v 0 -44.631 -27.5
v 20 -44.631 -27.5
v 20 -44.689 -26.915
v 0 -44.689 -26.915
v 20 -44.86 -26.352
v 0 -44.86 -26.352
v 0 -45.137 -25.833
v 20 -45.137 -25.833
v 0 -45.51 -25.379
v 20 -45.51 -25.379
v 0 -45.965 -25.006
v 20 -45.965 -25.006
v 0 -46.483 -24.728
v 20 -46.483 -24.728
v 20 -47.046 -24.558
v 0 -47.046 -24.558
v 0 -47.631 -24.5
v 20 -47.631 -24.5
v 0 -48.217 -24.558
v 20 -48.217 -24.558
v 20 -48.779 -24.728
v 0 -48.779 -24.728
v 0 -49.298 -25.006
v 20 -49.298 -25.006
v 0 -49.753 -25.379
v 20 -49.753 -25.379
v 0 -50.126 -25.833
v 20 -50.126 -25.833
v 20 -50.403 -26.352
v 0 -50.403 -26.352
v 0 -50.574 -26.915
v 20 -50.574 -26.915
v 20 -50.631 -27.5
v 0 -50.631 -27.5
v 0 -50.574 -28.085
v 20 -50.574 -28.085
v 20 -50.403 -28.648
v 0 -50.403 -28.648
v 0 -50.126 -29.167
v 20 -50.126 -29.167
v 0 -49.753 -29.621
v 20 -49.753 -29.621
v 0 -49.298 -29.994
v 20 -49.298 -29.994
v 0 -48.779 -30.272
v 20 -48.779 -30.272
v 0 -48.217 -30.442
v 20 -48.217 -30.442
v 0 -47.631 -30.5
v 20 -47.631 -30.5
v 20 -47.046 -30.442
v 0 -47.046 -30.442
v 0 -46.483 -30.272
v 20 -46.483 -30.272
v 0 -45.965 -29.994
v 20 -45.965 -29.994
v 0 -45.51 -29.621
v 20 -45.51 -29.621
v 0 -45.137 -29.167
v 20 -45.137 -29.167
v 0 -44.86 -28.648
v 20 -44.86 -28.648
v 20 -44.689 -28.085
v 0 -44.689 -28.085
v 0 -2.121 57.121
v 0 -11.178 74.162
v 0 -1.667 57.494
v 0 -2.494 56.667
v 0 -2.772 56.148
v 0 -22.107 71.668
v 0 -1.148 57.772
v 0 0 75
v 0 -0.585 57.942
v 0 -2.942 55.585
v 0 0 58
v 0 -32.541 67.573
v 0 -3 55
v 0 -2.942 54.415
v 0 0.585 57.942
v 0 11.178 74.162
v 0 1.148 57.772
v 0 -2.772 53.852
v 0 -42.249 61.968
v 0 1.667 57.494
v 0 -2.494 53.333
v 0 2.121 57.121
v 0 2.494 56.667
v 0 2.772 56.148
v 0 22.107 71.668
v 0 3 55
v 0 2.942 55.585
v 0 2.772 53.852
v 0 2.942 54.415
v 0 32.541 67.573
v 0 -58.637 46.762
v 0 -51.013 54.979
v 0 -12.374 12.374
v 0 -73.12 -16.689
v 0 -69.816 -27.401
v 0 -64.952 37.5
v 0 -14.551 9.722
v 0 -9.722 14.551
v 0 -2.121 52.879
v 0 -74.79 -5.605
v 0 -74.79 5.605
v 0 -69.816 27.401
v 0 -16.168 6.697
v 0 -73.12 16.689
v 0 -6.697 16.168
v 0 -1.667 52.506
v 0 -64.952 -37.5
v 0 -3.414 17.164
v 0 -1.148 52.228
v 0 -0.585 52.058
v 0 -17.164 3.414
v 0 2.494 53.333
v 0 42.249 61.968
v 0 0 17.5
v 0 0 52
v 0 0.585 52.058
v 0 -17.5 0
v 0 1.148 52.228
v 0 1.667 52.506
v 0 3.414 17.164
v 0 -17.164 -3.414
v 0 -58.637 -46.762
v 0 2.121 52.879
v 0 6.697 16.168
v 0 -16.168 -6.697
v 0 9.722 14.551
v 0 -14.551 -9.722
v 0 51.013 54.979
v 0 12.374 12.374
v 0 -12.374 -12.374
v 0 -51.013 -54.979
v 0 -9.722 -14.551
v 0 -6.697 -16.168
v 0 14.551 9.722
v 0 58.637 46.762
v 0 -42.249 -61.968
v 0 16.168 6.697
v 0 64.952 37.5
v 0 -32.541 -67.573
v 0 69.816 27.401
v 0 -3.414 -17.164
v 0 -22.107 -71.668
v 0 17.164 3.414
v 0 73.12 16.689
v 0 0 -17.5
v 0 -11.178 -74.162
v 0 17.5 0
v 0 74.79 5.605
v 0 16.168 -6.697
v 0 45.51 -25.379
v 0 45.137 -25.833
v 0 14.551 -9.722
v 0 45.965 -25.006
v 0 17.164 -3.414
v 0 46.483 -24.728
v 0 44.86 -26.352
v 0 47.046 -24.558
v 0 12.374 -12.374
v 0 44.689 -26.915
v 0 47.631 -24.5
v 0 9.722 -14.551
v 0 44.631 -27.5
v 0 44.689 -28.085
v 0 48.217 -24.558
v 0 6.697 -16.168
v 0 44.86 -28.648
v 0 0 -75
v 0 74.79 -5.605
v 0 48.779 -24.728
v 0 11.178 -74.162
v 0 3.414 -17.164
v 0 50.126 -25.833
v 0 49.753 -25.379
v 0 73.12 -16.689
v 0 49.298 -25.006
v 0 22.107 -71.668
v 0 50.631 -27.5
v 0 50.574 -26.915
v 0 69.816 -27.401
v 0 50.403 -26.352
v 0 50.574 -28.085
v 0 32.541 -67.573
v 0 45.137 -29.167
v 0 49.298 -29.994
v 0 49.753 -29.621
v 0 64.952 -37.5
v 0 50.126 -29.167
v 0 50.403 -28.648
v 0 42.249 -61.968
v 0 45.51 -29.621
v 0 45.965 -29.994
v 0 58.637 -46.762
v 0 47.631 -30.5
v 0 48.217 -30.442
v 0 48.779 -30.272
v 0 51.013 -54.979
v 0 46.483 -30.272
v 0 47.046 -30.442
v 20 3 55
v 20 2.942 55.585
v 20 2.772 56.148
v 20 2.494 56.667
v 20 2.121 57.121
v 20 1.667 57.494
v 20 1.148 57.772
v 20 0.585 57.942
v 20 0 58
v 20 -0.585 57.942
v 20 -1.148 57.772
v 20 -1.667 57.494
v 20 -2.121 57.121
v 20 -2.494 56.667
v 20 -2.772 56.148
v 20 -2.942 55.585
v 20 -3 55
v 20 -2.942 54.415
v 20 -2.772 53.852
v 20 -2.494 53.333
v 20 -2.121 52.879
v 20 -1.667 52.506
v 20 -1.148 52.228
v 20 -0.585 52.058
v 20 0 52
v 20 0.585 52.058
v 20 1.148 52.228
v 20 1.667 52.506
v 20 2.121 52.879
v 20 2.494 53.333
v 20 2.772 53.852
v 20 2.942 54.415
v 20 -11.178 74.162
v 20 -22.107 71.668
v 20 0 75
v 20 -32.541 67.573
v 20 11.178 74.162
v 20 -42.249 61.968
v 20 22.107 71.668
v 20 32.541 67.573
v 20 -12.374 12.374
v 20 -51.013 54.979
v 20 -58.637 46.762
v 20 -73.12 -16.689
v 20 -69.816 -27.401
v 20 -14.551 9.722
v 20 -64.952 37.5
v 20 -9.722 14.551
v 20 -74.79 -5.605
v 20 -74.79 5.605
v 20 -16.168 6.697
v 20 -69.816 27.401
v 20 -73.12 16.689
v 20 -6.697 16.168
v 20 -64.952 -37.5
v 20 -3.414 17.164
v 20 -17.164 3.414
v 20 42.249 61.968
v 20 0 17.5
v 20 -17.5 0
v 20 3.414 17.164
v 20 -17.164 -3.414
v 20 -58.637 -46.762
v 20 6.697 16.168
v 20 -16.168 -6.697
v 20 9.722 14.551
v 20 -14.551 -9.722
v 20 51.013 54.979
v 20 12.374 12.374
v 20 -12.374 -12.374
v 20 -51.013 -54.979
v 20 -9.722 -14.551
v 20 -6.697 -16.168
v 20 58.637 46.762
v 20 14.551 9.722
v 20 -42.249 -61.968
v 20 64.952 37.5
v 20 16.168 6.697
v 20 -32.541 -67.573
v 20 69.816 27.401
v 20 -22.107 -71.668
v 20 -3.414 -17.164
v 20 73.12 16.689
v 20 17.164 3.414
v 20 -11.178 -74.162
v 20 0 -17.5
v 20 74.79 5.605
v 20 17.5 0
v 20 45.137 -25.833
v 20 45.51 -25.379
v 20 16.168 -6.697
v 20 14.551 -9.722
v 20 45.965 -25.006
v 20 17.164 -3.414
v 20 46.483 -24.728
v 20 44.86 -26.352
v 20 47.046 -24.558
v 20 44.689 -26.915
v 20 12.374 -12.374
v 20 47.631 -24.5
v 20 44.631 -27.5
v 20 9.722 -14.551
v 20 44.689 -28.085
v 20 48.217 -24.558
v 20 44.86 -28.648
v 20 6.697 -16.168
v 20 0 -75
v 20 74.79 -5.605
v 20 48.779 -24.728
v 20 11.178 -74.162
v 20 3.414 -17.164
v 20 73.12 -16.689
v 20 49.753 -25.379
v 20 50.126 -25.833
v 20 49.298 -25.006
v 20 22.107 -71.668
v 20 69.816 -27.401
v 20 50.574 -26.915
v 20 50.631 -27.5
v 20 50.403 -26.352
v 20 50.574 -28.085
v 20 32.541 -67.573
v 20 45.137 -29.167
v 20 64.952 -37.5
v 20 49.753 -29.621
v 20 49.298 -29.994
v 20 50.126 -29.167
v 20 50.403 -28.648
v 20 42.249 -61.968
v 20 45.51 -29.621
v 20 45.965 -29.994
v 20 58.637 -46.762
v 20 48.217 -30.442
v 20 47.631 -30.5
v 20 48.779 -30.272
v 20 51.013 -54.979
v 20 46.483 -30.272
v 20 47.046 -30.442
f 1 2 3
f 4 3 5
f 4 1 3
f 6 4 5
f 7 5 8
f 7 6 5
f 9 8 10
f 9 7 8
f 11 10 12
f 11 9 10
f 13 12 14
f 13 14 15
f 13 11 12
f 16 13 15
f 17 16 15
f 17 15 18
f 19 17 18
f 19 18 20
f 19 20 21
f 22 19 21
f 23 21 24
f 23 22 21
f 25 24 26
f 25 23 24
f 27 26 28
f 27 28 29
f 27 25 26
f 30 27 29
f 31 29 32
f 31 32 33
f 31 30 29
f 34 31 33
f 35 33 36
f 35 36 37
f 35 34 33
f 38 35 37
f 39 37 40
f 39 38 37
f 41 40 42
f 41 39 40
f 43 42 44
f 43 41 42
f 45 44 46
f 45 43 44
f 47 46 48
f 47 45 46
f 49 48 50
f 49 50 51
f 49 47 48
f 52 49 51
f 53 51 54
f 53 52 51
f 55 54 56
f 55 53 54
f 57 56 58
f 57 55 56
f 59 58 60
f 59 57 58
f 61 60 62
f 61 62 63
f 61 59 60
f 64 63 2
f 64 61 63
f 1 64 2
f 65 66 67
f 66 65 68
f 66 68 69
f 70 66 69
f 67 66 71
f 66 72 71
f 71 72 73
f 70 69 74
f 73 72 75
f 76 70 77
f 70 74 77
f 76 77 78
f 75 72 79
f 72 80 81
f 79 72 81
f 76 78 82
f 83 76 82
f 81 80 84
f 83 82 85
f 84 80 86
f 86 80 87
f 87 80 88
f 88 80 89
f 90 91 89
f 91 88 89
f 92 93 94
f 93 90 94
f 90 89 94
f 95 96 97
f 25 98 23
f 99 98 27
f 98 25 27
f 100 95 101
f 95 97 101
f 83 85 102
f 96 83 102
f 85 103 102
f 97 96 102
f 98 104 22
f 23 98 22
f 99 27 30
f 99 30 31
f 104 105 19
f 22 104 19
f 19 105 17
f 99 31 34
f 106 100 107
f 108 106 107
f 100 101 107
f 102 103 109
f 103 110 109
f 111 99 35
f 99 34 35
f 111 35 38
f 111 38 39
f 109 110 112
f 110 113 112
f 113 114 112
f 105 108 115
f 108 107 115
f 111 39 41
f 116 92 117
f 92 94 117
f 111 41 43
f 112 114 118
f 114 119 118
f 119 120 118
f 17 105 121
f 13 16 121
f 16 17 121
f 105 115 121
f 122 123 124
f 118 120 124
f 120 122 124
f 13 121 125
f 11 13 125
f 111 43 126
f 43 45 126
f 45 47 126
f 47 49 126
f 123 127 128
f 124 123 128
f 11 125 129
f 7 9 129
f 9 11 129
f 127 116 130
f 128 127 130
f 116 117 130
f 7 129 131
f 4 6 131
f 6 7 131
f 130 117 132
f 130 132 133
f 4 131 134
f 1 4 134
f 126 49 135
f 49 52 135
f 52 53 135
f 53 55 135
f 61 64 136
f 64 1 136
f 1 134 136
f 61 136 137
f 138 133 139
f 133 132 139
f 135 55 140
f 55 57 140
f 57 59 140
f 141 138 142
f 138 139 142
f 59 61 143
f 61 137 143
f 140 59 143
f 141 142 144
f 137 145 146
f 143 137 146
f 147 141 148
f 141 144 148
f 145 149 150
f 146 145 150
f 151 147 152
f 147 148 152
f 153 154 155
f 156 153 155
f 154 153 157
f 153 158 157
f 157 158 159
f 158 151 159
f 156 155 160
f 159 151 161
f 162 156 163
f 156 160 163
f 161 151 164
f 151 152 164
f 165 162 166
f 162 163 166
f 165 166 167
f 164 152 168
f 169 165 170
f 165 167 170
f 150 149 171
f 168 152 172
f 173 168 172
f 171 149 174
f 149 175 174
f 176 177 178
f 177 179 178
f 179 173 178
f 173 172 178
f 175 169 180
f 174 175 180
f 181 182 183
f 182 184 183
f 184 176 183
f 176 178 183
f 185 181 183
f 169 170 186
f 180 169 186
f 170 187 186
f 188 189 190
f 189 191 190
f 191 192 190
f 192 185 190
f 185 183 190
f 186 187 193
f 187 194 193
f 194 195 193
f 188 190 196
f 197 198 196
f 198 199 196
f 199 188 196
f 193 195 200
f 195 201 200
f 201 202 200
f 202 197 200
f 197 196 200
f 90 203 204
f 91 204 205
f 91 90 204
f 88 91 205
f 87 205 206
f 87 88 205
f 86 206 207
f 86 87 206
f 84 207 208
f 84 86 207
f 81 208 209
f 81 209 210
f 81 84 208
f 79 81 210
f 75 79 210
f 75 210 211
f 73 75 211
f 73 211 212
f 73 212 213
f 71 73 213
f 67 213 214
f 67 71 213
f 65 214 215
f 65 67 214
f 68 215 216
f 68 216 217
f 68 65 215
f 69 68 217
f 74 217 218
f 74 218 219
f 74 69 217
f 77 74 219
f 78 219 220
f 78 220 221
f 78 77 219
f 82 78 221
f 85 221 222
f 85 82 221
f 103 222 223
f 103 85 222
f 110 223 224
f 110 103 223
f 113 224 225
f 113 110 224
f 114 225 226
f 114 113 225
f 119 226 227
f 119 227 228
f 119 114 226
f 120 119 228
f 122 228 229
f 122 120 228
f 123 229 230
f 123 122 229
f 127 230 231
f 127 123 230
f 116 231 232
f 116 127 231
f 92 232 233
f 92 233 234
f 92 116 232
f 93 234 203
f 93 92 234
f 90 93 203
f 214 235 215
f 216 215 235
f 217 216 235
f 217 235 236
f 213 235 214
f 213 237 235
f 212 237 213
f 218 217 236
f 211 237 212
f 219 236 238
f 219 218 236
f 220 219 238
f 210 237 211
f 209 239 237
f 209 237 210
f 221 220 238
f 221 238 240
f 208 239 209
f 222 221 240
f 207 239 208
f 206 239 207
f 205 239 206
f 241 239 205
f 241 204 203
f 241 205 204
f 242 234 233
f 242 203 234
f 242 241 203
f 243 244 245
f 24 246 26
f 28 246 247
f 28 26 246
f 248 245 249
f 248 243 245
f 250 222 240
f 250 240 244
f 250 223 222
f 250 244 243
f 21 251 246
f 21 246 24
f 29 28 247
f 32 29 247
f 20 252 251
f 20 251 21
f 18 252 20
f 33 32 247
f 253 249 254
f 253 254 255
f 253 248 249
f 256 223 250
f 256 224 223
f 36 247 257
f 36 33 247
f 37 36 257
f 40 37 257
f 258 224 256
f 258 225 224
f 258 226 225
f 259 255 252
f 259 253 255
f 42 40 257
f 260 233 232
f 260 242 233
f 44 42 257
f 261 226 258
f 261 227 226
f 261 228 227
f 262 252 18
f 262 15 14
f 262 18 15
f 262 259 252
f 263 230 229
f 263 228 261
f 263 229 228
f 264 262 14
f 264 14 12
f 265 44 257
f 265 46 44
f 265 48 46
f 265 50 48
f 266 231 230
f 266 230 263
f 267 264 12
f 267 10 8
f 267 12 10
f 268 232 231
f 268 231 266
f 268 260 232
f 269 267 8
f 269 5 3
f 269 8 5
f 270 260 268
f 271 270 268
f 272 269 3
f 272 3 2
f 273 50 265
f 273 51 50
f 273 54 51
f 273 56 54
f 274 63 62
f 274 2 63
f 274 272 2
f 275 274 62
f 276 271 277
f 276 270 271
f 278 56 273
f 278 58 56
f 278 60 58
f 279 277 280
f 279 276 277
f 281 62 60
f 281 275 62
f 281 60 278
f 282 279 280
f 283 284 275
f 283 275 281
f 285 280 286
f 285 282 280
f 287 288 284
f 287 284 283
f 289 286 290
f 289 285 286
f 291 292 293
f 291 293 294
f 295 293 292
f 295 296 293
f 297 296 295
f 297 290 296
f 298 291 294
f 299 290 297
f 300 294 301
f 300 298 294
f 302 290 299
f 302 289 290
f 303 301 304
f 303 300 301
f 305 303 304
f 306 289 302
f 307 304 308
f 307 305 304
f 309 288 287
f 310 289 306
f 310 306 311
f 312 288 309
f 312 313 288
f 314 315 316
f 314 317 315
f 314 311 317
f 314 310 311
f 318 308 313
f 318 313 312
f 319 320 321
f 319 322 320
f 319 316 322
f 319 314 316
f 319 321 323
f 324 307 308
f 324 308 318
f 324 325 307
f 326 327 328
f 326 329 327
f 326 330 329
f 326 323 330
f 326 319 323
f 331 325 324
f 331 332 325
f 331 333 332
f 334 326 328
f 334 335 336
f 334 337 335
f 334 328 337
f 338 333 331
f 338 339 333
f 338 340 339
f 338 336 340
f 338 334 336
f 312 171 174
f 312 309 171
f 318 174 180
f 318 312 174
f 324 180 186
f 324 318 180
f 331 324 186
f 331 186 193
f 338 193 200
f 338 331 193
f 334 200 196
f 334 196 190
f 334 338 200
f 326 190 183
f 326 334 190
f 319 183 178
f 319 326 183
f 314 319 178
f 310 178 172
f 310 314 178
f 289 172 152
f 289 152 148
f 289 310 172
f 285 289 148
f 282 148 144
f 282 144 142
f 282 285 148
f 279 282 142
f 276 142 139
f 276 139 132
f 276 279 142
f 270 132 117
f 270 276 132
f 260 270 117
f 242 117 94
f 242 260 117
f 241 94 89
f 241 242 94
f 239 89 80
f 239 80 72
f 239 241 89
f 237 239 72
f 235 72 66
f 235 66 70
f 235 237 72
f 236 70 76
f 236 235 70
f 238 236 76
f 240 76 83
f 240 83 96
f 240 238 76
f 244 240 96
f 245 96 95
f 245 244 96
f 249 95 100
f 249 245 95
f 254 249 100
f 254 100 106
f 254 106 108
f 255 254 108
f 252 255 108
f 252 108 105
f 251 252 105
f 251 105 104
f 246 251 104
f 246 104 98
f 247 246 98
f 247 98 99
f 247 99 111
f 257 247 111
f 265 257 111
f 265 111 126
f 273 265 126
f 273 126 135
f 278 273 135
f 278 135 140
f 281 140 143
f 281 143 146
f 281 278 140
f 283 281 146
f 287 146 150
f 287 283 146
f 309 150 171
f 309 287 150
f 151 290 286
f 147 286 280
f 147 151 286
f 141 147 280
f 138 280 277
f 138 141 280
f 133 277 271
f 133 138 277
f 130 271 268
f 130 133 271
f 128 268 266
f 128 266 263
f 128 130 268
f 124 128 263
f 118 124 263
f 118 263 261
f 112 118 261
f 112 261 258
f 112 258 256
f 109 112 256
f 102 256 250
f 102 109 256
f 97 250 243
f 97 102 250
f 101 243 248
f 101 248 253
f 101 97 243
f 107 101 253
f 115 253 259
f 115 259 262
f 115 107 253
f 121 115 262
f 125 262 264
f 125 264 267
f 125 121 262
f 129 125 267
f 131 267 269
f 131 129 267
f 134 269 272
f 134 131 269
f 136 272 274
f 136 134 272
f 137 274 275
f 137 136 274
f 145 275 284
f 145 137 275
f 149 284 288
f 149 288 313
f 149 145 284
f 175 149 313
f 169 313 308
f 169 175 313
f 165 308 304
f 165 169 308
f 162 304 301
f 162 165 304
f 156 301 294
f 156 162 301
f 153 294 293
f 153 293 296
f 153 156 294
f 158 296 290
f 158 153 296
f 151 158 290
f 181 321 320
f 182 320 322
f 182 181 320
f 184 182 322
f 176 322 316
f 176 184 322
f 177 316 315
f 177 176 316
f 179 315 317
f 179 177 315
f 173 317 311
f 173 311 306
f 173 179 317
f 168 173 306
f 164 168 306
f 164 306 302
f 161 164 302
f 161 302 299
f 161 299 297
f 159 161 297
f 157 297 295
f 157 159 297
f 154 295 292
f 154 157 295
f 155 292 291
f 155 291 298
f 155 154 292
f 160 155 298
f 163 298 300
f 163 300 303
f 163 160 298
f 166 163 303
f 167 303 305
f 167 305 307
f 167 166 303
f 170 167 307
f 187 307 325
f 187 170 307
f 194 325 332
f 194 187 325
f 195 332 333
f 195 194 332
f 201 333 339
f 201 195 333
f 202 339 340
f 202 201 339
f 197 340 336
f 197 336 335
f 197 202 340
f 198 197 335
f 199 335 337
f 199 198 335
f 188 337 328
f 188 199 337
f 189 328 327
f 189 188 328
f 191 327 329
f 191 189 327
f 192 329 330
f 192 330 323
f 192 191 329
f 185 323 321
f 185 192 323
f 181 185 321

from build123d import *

# Parameters (mm, degrees)
F0_W     = 20
F0_H     = 75
F2_R     = 17.5
F2_R_2   = 3
F3_DEPTH = 20


with BuildPart() as f1:
    # F0 (on Front) → F1 (revolve)
    with BuildSketch(Plane.XZ):
        with Locations((10, -37.5)):
            Rectangle(F0_W, F0_H)
    revolve(axis=Axis((10, 0, 0), (1, 0, 0)))

    # F2 (on Right) → F3 (cut, through all)
    with BuildSketch(Plane.YZ):
        Circle(F2_R)
        with Locations((0, 55)):
            Circle(F2_R_2)
        with Locations((-47.631397, -27.5)):
            Circle(F2_R_2)
        with Locations((47.631397, -27.5)):
            Circle(F2_R_2)
    extrude(amount=F3_DEPTH, mode=Mode.SUBTRACT)


solid = f1.part
